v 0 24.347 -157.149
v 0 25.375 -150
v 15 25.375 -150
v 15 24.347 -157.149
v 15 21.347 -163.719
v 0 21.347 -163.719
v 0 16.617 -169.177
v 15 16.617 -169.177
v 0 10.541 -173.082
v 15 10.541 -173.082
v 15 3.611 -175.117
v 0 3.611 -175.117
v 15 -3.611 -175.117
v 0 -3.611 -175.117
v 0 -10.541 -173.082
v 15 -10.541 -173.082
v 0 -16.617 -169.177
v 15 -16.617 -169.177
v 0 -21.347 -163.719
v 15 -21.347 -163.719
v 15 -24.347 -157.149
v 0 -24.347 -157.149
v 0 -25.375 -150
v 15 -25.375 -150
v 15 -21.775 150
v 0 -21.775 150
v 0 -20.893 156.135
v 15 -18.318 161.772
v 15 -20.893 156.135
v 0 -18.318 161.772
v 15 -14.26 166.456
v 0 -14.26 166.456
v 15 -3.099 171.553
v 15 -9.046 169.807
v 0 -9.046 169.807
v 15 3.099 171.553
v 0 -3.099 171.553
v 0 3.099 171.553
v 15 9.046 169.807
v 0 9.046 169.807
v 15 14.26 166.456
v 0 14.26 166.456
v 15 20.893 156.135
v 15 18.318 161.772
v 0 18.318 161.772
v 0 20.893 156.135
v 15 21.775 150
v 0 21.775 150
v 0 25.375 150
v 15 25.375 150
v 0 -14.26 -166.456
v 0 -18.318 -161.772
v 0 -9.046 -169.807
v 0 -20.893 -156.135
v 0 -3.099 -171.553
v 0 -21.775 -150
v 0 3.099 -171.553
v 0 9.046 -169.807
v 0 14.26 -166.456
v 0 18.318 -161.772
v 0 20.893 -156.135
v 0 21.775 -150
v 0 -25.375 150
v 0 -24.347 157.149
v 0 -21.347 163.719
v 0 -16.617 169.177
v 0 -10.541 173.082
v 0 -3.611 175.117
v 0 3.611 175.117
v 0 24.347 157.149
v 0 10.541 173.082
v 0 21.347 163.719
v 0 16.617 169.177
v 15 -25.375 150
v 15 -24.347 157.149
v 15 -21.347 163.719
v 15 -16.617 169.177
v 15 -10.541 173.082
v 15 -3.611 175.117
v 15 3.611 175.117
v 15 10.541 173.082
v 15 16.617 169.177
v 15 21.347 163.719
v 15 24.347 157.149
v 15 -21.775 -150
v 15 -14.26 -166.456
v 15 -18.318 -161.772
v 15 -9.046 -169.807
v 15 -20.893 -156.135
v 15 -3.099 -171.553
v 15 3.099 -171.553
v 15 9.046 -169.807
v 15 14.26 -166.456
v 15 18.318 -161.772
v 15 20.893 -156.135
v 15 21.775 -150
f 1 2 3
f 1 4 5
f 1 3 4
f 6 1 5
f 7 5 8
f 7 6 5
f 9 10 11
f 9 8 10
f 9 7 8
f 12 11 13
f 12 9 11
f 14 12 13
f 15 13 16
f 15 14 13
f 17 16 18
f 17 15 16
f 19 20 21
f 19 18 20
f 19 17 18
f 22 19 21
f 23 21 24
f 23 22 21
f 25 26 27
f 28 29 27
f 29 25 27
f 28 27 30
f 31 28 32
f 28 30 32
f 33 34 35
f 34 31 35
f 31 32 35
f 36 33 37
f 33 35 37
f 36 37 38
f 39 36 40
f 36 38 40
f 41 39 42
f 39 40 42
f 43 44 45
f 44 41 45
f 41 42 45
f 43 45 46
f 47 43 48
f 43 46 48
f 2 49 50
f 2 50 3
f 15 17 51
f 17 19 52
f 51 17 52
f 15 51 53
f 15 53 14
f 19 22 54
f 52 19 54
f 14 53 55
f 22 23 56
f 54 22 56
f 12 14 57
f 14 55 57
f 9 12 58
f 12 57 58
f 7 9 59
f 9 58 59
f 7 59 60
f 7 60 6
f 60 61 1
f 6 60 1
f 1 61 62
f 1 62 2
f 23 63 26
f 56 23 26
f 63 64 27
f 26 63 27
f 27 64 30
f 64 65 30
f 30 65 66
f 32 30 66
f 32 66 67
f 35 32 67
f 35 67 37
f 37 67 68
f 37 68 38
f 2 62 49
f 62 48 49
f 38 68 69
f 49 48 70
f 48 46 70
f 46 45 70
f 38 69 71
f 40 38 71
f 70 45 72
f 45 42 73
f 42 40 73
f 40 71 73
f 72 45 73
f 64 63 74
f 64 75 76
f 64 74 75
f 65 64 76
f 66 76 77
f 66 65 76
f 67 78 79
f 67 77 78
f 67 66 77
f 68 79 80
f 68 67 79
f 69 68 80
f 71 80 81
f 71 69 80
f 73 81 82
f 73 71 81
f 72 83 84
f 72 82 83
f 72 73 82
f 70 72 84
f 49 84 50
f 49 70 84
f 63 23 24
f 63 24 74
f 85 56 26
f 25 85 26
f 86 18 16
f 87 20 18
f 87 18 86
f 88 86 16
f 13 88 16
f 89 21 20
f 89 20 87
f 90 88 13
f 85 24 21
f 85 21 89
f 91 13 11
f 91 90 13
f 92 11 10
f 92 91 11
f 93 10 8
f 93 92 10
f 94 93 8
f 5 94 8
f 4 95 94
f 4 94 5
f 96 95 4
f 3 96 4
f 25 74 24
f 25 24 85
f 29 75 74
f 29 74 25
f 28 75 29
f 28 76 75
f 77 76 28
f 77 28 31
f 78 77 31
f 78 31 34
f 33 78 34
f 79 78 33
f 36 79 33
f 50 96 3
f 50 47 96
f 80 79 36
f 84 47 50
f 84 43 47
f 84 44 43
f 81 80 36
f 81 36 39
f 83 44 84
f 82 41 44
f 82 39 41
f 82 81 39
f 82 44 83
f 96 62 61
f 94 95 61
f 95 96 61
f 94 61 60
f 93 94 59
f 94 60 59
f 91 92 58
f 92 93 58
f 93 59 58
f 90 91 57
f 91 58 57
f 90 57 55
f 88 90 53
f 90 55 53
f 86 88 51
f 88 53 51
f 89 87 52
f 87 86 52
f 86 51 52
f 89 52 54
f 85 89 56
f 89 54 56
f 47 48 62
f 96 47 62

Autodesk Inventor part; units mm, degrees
ref_plane "YZ Plane" through (0, 0, 0) normal (1, 0, 0) x (0, 1, 0)
ref_plane "XZ Plane" through (0, 0, 0) normal (0, 1, 0) x (-1, 0, 0)
ref_plane "XY Plane" through (0, 0, 0) normal (0, 0, 1) x (1, 0, 0)
sketch "Sketch1" plane through (0, 0, 0) normal (1, 0, 0) x (0, 1, 0)
  line L0 (0, 150) -> (0, -150) construction
  line L1 (-23.875, 150) -> (-23.875, -150)
  line L2 (23.875, -150) -> (23.875, 150)
  arc A0 (23.875, 150) -> (-23.875, 150) centre (0, 150) ccw
  arc A1 (-23.875, -150) -> (23.875, -150) centre (0, -150) ccw
  line L3 (0, 0) -> (300, 0) construction
  line L4 (25.375, 150) -> (25.375, -150)
  arc A2 (-25.375, -150) -> (25.375, -150) centre (0, -150) ccw
  line L5 (-25.375, -150) -> (-25.375, 150)
  arc A3 (25.375, 150) -> (-25.375, 150) centre (0, 150) ccw
  line L6 (21.775, 150) -> (21.775, -150)
  arc A4 (-21.775, -150) -> (21.775, -150) centre (0, -150) ccw
  line L7 (-21.775, -150) -> (-21.775, 150)
  arc A5 (21.775, 150) -> (-21.775, 150) centre (0, 150) ccw
  dimension "d0" = 150
  dimension "d1" = 90
  dimension "d2" = 47.75
  dimension "d3" = 1.5
  dimension "d4" = 2.1
extrude "Extrusion1" add sketch "Sketch1" along normal blind 15 contours A0 L2 A1 L1 | L4 A2 L5 A3
properties part number "Belt 750" material "Rubber"
